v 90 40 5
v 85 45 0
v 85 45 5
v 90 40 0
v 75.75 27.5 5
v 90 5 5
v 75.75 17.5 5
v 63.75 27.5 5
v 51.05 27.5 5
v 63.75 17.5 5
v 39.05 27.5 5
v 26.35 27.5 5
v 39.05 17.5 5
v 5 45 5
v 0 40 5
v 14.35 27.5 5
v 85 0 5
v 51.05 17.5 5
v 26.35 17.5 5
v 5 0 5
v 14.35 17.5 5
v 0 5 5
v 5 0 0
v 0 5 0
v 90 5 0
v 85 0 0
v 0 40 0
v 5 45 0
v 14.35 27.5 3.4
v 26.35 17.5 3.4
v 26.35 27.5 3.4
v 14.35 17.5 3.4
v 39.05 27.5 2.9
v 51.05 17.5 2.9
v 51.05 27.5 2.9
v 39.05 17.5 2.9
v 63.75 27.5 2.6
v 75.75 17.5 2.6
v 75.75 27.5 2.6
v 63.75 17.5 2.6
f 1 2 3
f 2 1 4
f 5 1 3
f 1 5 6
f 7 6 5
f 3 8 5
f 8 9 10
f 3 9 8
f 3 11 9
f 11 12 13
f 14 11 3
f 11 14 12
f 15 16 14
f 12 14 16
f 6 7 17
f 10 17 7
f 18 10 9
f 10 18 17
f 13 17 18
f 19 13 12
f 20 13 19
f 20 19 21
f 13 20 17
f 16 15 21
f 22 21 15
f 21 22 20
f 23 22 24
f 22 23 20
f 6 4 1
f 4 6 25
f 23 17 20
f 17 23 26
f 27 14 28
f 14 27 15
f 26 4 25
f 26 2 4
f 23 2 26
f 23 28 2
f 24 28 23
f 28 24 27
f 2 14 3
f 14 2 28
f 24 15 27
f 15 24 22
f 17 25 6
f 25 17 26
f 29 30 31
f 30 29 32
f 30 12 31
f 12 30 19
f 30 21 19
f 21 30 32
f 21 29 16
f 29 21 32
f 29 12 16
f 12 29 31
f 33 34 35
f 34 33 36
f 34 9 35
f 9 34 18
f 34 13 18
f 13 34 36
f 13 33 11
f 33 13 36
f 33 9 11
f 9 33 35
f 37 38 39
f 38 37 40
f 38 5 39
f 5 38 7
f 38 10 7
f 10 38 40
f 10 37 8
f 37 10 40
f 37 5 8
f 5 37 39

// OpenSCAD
$fn = 32;

// ----------------------------------------------------------------------
// Windowed plate: 3 voids, 90 x 45 x 5 mm
// ----------------------------------------------------------------------

// --- parameters (mm) ---
plate_l = 90;             // plate length, X
plate_w = 45;             // plate width, Y
plate_t = 5;              // plate thickness, Z
edge_margin = 8;          // wall from the plate edge to any window
windows = 3;              // number of windows in the row
win_l = 12;               // window length
win_w = 10;               // window width
win_pitch = 24.7;         // window pitch along X
depth_1 = 1.6;            // depth of void 1 (full thickness = through)
depth_2 = 2.1;            // depth of void 2 (full thickness = through)
depth_3 = 2.4;            // depth of void 3 (full thickness = through)
corner_c = 5;             // corner chamfer of the plate

profile = [[5, 0], [85, 0], [90, 5], [90, 40], [85, 45], [5, 45], [0, 40], [0, 5]];  // primary outline, 8 points, counter clockwise
void_1 = [[14.35, 17.5], [26.35, 17.5], [26.35, 27.5], [14.35, 27.5]];  // window 1 of the row, 4 points
void_2 = [[39.05, 17.5], [51.05, 17.5], [51.05, 27.5], [39.05, 27.5]];  // window 2 of the row, 4 points
void_3 = [[63.75, 17.5], [75.75, 17.5], [75.75, 27.5], [63.75, 27.5]];  // window 3 of the row, 4 points

// --- the one profile operation ---
difference() {
  linear_extrude(height = plate_t) polygon(points = profile);
  translate([0, 0, plate_t - depth_1])
    linear_extrude(height = depth_1 + 1) polygon(points = void_1);
  translate([0, 0, plate_t - depth_2])
    linear_extrude(height = depth_2 + 1) polygon(points = void_2);
  translate([0, 0, plate_t - depth_3])
    linear_extrude(height = depth_3 + 1) polygon(points = void_3);
}
